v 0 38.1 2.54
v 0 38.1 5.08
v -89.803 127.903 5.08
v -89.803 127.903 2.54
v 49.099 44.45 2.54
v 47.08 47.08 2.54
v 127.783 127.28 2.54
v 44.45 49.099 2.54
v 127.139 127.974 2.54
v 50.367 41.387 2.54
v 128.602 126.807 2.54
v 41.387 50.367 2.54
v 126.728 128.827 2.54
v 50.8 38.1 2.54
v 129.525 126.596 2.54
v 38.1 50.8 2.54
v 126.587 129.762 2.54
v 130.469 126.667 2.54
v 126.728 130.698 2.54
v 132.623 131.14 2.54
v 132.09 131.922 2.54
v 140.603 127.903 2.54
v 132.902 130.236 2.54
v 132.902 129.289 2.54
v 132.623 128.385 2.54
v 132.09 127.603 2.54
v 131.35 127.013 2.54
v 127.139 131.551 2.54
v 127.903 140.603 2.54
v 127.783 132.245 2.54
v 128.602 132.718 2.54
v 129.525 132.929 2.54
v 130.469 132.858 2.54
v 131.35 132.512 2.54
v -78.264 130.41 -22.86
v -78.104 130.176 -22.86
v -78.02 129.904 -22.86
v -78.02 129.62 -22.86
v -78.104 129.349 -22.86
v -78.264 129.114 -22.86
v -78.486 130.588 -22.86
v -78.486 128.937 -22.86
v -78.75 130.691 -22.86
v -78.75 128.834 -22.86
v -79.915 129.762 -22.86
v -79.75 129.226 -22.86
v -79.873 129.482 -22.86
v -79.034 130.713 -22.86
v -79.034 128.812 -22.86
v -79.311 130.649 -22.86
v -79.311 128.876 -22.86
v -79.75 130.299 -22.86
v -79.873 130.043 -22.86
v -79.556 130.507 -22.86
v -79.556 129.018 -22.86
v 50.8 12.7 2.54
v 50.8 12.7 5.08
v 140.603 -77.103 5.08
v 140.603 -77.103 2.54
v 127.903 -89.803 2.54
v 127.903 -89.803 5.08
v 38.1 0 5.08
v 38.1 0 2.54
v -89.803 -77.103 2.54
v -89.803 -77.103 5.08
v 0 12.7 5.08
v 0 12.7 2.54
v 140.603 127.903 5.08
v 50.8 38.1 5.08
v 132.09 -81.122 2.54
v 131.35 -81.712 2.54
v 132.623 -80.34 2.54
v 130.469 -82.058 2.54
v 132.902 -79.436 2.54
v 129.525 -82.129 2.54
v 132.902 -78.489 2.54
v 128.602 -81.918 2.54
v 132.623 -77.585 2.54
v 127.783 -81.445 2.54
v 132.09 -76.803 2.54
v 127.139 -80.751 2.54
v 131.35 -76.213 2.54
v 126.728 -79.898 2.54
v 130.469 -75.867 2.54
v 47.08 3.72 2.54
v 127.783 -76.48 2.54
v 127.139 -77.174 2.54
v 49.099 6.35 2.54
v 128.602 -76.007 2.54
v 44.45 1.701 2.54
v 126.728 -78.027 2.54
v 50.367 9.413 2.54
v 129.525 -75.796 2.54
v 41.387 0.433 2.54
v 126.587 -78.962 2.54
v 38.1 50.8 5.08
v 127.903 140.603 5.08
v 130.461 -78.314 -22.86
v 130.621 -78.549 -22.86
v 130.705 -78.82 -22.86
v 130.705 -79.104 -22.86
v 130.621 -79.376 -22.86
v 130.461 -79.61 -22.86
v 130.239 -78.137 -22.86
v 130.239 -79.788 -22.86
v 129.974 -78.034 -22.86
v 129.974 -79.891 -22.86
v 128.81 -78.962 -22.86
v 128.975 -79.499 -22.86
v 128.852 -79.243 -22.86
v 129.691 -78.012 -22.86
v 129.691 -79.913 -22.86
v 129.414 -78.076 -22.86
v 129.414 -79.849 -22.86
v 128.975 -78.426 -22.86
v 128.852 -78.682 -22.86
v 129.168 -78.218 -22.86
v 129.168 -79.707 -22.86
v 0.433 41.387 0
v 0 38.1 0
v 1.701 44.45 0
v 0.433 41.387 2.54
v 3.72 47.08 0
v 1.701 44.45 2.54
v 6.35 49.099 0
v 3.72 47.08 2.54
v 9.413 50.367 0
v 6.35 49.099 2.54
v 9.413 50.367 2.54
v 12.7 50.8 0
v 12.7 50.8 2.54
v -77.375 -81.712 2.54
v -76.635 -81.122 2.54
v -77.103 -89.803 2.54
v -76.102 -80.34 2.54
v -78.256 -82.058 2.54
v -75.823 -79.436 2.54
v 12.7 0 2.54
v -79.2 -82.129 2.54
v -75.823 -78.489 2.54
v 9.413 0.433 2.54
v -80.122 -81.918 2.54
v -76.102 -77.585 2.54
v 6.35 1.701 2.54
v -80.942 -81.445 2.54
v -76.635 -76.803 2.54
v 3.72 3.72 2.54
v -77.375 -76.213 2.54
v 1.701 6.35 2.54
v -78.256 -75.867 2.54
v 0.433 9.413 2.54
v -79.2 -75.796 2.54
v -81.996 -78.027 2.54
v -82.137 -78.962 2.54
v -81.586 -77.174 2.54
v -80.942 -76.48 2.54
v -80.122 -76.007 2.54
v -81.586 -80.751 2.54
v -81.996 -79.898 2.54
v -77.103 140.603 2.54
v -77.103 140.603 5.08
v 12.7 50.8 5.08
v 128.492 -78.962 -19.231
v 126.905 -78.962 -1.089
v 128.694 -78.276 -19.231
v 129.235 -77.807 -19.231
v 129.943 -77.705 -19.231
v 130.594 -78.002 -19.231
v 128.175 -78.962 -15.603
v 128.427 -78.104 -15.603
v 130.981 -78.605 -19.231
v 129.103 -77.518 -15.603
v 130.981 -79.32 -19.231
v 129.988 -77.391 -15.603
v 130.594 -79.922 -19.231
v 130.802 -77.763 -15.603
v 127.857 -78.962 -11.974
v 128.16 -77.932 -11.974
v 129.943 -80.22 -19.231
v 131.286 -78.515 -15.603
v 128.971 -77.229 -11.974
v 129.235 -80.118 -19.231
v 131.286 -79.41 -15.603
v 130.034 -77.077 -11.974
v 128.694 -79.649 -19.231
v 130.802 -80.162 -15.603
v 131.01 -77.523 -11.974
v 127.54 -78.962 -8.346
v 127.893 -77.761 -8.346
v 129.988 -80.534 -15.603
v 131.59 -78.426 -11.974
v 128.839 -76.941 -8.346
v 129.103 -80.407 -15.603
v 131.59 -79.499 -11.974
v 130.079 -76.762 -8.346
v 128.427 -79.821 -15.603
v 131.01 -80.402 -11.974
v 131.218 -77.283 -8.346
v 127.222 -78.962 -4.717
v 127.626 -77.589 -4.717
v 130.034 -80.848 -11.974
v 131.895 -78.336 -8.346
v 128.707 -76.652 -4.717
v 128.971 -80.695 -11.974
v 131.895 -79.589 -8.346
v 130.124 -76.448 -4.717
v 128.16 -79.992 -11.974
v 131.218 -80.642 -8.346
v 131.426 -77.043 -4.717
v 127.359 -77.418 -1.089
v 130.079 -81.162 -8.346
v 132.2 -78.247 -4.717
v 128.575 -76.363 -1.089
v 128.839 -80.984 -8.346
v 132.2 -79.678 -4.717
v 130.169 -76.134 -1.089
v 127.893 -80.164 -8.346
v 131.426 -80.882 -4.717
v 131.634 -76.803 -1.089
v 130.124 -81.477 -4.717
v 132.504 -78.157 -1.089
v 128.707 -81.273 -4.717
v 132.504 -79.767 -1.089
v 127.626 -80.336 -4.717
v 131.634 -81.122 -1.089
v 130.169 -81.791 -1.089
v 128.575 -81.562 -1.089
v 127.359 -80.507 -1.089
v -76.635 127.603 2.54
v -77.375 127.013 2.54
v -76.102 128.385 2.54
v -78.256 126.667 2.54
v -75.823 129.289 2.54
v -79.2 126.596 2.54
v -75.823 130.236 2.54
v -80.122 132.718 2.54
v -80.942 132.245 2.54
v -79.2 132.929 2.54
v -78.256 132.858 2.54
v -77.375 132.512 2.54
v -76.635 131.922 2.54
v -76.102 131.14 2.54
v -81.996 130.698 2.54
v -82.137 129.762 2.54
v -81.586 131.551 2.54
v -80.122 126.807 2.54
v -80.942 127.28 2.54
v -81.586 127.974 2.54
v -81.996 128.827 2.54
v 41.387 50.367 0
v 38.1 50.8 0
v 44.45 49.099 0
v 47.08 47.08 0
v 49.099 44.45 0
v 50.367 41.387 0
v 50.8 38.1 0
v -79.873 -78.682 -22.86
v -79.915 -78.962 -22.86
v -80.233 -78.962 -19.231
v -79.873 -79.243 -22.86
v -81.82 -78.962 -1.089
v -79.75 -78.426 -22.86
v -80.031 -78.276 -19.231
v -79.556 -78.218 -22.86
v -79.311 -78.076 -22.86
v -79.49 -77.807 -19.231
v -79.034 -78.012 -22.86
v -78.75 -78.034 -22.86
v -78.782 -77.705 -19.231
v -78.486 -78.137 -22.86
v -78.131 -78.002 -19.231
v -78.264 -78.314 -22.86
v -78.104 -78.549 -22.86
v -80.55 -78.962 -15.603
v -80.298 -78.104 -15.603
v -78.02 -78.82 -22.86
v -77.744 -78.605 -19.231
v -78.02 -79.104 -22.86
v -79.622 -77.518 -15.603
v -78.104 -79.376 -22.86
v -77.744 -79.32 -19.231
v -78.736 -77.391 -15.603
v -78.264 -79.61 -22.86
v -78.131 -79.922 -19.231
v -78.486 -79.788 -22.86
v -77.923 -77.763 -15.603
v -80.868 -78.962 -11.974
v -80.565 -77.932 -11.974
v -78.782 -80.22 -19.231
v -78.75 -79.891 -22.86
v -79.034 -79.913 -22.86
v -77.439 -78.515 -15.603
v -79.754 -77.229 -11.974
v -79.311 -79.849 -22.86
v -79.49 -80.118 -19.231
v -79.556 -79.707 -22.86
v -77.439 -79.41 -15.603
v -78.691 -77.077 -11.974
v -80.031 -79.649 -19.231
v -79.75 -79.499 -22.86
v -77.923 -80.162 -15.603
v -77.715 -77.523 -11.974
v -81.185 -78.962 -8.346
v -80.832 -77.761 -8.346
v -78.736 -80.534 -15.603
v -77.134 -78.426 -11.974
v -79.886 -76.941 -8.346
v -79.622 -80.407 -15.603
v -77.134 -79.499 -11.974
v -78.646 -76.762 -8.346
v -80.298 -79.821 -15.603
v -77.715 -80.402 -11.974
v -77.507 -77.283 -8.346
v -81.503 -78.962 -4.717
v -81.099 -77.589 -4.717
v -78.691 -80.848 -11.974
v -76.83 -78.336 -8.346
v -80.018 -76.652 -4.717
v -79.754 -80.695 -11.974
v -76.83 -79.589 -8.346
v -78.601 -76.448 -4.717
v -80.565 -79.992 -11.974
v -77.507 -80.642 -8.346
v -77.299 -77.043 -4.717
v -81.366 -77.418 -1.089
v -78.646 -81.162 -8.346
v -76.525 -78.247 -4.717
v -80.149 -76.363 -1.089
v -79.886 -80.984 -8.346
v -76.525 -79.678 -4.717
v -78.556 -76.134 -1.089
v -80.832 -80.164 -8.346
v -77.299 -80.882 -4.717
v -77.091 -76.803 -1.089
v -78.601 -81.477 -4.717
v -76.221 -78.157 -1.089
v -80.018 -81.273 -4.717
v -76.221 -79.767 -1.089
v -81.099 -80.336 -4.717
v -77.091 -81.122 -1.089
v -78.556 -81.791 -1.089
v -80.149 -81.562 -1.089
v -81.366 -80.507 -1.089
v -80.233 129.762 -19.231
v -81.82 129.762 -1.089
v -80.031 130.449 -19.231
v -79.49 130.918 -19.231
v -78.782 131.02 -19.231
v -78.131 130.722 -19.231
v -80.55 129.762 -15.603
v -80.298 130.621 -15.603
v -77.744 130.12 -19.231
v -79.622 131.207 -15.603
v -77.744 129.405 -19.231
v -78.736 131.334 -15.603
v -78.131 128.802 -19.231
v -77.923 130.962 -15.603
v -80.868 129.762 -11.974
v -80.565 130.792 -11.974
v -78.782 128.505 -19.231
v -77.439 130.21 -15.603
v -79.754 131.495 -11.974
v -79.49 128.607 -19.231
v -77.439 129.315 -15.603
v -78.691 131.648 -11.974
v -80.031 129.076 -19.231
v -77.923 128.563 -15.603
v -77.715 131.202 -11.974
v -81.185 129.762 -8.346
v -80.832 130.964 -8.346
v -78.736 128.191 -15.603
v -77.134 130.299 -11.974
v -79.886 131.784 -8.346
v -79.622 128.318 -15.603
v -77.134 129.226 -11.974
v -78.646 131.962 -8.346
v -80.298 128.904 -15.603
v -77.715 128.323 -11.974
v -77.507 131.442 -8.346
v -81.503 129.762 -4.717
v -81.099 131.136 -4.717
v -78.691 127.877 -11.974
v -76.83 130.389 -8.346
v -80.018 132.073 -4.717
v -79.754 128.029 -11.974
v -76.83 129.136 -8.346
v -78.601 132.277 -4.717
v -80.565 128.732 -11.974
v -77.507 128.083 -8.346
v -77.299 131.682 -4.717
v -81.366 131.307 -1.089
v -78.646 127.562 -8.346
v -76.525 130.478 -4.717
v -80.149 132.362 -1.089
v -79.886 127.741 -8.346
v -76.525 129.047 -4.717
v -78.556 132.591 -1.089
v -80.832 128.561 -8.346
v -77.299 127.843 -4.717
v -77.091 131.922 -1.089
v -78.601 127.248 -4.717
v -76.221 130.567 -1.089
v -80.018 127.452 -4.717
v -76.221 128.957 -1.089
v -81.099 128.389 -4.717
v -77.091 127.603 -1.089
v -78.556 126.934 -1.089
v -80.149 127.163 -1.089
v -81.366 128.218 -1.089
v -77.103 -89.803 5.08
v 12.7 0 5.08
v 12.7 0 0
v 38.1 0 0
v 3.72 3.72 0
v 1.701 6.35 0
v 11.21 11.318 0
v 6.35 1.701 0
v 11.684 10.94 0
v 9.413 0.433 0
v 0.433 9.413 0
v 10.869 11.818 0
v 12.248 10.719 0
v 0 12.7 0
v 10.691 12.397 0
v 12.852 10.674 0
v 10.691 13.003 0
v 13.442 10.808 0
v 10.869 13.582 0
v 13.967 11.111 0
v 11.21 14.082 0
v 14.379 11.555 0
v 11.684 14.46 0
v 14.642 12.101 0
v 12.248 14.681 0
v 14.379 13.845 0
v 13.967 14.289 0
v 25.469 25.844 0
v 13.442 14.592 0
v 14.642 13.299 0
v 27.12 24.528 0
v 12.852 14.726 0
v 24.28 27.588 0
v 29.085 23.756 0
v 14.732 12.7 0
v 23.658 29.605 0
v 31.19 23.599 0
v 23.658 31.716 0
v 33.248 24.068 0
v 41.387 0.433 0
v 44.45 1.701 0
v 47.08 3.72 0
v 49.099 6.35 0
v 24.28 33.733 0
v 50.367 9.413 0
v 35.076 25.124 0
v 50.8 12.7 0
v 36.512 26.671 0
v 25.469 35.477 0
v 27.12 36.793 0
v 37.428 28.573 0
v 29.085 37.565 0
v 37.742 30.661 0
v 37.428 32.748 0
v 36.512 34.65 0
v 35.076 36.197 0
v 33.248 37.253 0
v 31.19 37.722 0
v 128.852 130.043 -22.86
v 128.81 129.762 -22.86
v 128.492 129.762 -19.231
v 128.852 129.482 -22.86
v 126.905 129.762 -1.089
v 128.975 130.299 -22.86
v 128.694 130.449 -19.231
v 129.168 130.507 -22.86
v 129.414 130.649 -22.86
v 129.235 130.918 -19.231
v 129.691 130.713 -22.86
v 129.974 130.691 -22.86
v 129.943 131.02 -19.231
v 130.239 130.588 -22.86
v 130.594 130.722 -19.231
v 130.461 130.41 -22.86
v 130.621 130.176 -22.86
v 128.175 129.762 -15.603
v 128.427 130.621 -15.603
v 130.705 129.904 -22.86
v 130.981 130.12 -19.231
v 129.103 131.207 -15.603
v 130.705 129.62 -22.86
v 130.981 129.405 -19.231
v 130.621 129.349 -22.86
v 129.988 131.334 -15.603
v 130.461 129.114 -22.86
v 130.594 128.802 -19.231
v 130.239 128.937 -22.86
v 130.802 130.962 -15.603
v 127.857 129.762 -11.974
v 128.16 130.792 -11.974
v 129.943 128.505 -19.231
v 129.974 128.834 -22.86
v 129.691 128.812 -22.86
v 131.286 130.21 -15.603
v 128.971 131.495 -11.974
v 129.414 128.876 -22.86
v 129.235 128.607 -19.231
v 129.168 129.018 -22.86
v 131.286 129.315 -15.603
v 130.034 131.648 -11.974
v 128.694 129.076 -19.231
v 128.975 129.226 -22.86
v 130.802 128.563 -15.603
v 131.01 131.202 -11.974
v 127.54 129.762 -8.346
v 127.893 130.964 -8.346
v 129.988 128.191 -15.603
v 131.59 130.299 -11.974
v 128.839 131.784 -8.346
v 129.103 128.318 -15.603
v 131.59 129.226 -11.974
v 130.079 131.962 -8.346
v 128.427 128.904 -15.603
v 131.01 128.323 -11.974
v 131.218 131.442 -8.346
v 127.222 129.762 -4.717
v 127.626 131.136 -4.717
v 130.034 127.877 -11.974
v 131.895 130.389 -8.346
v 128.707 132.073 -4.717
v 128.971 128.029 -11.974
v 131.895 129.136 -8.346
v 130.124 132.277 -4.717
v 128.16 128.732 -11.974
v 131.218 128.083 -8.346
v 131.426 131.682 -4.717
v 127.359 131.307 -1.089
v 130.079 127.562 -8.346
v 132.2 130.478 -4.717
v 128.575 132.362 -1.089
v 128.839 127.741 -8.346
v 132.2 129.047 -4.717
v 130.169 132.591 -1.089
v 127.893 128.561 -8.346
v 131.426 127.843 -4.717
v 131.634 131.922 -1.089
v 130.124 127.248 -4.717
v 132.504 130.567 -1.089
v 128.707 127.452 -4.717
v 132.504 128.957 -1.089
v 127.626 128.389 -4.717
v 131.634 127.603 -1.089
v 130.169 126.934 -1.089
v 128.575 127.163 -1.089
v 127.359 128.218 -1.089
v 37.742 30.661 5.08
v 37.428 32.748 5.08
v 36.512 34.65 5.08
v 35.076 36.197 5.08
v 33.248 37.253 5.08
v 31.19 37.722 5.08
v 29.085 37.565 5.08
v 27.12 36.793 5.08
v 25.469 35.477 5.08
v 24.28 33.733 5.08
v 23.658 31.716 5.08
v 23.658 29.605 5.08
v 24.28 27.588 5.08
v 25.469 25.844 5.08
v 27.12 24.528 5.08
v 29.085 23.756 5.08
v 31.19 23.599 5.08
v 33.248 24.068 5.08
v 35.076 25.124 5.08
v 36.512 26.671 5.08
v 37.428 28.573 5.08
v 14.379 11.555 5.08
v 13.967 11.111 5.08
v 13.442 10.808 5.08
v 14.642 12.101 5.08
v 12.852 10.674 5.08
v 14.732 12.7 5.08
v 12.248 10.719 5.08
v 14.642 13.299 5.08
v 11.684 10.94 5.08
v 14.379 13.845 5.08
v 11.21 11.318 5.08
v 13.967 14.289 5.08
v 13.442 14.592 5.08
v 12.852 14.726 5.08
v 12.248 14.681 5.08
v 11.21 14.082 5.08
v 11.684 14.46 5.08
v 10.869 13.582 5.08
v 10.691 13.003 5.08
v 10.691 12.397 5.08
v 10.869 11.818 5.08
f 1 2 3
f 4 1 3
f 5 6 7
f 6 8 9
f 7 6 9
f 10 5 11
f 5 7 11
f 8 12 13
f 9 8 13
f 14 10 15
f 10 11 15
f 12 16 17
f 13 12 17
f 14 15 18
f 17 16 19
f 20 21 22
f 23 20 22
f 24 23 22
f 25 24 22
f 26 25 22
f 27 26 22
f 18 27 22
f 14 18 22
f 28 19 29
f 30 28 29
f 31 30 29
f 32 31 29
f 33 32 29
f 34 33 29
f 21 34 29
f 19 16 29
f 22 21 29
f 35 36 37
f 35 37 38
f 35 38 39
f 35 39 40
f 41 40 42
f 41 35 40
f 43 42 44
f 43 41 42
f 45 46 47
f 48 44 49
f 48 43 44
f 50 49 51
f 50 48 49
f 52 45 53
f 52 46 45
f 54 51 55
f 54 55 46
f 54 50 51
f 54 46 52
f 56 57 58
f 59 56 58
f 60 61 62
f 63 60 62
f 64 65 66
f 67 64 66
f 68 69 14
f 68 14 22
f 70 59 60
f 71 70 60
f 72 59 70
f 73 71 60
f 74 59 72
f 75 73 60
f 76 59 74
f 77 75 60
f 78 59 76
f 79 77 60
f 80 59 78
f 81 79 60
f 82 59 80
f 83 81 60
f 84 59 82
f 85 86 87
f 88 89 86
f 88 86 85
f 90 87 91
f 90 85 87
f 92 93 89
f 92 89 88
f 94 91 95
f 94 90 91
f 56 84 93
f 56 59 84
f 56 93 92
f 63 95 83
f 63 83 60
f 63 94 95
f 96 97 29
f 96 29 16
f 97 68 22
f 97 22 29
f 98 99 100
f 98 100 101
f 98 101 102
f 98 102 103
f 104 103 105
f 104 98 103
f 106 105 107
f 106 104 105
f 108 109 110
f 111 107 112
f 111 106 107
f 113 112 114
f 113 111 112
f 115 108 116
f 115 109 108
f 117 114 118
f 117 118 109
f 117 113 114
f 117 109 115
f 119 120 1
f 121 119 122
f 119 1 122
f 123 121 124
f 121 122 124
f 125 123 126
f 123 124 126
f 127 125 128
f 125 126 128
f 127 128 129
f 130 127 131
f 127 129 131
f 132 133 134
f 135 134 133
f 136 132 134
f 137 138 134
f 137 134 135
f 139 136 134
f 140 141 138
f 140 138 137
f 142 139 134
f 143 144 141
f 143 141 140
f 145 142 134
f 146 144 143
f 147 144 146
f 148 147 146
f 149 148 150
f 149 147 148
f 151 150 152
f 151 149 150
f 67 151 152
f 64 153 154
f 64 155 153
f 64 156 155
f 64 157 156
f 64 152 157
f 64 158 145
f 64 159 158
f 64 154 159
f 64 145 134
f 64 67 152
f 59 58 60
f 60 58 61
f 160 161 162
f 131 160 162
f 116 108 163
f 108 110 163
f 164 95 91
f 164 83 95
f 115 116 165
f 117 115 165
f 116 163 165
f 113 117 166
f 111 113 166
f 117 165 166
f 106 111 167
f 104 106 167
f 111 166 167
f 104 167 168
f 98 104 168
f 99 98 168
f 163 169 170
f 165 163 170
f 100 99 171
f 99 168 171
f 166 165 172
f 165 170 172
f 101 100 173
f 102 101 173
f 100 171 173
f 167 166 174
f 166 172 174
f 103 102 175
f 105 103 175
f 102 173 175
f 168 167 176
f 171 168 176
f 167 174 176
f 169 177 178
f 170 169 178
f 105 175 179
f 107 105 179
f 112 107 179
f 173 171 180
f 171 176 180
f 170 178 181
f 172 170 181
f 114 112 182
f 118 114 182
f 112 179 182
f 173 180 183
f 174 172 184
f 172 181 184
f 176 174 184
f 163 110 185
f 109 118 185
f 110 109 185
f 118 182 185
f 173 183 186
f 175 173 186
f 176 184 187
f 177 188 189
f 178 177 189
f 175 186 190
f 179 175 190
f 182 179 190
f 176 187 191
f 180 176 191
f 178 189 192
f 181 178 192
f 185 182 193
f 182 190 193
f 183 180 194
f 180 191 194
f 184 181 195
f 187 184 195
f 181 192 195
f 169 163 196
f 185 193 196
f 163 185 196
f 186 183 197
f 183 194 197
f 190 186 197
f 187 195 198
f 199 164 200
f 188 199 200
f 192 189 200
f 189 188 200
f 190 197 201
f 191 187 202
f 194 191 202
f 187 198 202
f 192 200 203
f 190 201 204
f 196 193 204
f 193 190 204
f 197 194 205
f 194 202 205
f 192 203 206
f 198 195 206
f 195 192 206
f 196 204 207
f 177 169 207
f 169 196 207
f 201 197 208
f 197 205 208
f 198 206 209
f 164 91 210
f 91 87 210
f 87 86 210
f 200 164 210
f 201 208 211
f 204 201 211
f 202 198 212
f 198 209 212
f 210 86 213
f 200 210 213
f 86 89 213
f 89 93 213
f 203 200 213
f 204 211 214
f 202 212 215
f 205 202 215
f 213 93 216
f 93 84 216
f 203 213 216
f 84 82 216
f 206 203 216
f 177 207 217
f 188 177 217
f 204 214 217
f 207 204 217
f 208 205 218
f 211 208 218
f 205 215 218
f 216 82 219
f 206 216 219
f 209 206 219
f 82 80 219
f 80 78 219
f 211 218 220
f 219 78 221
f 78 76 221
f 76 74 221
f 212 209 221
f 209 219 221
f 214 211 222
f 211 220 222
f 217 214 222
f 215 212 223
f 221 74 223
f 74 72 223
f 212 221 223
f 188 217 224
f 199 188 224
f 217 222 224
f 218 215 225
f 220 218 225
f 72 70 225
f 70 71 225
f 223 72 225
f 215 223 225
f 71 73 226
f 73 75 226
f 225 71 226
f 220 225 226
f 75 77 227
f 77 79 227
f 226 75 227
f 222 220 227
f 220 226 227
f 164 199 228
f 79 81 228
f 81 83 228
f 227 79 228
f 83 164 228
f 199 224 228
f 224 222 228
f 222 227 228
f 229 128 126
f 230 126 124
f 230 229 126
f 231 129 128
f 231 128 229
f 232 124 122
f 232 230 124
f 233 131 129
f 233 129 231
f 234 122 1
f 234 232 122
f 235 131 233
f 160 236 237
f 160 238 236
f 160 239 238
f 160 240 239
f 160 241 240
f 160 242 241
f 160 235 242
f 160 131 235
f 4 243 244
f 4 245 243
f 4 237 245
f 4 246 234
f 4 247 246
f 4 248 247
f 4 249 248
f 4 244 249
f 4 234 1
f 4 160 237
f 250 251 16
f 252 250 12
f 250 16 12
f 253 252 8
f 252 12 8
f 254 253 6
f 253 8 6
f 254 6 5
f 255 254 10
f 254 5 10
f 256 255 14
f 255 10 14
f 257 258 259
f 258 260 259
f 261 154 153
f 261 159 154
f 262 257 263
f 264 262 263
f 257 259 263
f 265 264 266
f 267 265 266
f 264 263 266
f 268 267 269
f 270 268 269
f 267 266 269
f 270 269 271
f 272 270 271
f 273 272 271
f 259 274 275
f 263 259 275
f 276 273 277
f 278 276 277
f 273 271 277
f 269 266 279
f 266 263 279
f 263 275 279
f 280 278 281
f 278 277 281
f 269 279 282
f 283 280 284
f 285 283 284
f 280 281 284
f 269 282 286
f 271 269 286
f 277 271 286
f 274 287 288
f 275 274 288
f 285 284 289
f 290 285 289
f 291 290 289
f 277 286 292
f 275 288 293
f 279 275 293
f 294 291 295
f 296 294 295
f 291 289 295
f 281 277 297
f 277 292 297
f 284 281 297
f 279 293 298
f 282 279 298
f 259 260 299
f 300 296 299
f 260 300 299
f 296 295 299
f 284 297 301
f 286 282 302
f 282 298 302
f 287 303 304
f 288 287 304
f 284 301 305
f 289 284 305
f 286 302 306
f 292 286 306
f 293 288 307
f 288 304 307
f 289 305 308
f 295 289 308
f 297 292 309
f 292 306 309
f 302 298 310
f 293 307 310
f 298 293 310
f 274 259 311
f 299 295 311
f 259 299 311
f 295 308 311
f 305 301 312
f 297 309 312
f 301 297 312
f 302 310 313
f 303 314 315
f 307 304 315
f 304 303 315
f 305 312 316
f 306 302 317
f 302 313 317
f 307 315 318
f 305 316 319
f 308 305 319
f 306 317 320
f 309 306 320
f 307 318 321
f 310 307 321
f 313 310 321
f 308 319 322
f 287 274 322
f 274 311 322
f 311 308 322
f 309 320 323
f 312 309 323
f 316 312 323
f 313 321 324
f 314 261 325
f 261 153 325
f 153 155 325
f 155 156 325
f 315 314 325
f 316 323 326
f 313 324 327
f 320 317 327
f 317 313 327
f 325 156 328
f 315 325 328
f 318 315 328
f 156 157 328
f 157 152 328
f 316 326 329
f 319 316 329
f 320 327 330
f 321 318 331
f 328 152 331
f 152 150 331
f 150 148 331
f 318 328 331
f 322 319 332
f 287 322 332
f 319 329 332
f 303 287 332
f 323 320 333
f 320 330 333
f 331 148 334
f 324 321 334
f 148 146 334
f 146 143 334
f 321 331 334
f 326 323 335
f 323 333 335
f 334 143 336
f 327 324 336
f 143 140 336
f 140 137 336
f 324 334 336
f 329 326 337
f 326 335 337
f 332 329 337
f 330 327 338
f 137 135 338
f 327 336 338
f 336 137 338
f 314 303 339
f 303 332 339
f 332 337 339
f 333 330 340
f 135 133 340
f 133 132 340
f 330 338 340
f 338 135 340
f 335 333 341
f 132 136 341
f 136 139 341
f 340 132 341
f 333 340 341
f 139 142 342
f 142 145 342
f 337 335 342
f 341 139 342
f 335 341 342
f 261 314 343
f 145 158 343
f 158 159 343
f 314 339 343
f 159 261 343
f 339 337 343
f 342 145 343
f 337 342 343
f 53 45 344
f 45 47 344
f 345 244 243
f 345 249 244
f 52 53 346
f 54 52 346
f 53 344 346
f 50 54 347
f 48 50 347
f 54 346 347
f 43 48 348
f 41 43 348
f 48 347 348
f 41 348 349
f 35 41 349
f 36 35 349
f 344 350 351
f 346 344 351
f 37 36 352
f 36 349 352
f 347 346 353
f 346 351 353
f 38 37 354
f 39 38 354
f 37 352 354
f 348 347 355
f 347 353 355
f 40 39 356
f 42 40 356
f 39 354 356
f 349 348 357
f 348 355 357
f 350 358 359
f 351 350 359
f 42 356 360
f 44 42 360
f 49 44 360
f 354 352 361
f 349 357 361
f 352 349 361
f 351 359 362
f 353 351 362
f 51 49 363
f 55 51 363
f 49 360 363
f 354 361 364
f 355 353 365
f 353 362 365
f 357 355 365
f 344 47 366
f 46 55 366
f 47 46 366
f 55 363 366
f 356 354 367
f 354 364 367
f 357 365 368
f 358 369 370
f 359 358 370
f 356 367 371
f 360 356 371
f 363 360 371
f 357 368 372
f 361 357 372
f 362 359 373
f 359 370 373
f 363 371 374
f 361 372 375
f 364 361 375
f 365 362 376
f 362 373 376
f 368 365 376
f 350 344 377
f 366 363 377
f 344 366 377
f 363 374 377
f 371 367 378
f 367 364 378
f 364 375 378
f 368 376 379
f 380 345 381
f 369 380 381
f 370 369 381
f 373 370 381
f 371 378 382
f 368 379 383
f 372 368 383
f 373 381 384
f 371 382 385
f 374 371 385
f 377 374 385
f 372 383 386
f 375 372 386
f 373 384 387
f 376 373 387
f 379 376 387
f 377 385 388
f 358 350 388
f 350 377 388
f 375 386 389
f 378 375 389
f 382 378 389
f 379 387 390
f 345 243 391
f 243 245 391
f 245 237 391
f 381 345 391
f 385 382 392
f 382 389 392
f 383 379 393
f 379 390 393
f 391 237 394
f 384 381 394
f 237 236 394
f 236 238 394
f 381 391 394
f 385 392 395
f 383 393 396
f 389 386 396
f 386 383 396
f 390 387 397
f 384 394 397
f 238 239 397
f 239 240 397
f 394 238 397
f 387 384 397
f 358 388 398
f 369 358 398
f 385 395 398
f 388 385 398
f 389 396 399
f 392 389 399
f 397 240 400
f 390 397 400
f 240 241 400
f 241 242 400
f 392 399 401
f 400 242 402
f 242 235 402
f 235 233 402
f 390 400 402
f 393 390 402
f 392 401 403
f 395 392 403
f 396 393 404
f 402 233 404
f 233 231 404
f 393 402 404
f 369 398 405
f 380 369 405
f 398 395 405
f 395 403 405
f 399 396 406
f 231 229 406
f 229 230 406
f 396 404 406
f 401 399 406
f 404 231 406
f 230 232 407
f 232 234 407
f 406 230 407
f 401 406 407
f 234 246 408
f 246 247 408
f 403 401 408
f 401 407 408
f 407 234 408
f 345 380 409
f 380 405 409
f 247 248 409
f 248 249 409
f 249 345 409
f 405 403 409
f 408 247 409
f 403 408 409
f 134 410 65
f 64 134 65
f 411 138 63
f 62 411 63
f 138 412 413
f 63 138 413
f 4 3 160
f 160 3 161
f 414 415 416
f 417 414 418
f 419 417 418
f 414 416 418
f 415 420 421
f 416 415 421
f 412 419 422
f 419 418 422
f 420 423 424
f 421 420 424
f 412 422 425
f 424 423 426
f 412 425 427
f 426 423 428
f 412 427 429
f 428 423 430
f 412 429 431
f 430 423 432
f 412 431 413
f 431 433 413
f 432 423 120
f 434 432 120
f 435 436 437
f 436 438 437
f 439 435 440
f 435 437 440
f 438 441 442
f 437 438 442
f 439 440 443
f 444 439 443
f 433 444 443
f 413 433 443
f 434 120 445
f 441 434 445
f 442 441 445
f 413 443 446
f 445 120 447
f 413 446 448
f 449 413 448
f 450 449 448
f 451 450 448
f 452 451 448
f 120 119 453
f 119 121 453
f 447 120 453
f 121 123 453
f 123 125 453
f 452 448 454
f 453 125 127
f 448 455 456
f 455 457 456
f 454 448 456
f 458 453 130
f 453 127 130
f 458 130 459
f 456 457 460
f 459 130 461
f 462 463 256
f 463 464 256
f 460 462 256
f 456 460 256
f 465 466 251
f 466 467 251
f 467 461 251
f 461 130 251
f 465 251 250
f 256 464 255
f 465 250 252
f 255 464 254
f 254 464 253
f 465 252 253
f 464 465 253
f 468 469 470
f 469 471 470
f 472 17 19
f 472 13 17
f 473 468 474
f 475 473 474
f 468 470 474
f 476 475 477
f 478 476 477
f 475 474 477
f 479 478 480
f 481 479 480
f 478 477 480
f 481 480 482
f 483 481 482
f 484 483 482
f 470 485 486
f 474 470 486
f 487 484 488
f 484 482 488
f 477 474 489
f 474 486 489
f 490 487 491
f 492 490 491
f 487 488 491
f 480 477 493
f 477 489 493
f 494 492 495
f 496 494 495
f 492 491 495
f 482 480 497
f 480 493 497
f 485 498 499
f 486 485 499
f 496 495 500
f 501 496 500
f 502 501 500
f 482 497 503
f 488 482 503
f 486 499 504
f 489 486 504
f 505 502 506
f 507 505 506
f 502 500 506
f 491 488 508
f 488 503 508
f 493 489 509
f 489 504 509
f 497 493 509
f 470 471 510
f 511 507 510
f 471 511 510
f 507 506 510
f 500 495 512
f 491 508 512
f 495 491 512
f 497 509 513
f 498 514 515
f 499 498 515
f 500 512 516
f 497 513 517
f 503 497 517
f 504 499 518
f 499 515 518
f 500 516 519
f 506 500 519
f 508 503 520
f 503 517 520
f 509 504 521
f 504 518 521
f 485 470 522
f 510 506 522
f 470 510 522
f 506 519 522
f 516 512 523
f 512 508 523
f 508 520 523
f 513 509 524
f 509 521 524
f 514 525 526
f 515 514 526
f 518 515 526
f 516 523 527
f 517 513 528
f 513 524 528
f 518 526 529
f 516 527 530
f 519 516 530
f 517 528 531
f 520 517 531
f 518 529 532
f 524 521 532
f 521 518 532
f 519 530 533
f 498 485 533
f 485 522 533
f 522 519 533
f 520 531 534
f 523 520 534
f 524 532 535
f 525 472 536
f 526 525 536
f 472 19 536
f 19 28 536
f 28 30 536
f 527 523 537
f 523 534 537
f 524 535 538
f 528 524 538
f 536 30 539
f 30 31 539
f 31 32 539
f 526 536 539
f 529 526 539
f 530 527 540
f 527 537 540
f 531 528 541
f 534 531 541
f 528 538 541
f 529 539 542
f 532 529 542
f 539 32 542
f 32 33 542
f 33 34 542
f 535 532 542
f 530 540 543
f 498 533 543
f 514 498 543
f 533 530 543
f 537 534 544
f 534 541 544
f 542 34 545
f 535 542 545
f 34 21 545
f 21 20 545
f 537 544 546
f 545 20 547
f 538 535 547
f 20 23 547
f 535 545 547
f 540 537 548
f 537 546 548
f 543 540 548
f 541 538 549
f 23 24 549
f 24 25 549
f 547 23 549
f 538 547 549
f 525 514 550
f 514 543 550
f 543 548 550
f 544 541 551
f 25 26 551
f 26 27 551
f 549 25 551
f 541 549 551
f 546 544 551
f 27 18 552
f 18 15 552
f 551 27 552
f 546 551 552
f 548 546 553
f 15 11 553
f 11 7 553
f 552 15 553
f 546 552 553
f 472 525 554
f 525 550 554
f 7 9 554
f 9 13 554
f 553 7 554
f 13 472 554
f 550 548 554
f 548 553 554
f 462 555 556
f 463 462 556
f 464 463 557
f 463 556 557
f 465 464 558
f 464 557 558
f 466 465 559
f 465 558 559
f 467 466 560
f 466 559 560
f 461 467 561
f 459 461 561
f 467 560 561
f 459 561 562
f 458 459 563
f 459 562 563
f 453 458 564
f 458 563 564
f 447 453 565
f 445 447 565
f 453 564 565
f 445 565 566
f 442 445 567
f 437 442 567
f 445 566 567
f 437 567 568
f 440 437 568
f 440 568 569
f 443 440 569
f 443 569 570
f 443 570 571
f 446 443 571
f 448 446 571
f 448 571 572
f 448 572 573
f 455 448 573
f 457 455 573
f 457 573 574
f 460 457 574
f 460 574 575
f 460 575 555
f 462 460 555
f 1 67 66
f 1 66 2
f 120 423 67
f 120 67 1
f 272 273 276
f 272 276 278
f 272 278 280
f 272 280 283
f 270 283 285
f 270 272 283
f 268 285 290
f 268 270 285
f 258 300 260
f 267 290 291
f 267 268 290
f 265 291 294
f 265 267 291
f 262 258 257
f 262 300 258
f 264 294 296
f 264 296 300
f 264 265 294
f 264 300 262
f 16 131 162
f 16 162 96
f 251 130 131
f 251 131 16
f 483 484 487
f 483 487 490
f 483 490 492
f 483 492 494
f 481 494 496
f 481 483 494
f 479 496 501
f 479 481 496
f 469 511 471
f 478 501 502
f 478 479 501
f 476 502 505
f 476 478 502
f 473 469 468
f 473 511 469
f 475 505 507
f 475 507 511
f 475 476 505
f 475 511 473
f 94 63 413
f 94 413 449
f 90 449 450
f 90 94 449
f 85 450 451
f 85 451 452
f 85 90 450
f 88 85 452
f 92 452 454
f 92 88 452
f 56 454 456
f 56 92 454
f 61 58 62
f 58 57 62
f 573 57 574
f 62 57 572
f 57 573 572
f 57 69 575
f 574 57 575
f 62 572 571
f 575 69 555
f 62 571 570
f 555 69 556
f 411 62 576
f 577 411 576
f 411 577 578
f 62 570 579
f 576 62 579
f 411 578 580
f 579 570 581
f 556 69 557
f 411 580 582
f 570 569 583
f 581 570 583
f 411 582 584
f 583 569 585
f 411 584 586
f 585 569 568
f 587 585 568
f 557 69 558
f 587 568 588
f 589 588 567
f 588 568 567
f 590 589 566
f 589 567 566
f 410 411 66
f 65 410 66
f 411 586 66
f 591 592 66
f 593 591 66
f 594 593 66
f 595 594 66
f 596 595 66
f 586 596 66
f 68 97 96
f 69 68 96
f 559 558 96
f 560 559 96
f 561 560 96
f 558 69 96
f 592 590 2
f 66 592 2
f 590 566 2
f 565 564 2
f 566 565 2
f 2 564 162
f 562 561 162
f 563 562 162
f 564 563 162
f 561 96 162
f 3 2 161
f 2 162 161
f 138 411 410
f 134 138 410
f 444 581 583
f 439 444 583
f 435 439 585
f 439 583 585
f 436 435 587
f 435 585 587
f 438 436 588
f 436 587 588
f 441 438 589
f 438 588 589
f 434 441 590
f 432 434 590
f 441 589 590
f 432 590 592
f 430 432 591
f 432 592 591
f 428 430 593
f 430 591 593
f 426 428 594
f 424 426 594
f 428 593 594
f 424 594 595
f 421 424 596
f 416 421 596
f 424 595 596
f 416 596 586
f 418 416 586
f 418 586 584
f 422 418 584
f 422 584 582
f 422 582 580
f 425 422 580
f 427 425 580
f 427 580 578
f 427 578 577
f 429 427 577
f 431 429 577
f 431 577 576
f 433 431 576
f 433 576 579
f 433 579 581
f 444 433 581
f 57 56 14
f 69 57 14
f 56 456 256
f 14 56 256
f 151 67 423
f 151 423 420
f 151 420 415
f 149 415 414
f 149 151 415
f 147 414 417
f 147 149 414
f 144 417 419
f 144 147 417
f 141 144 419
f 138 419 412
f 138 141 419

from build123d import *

# Parameters (mm, degrees)
SKETCH3_W                     = 50.8
SKETCH3_H                     = 50.8
BOSS_EXTRUDE2_DEPTH           = 5.08
SKETCH4_R                     = 2.032
CUT_EXTRUDE2_DEPTH            = 73.021430144
FILLET2_R                     = 12.7
BOSS_EXTRUDE3_DEPTH           = 2.54
SKETCH6_R                     = 3.175
BOSS_EXTRUDE4_DEPTH           = 25.4
BOSS_EXTRUDE4_DRAFT           = 5
BOSS_EXTRUDE4_PROFILE_2_DEPTH = 25.4
BOSS_EXTRUDE4_PROFILE_2_DRAFT = 5
BOSS_EXTRUDE4_PROFILE_3_DEPTH = 25.4
BOSS_EXTRUDE4_PROFILE_3_DRAFT = 5
BOSS_EXTRUDE4_PROFILE_4_DEPTH = 25.4
BOSS_EXTRUDE4_PROFILE_4_DRAFT = 5
SKETCH7_R                     = 7.081764105
CUT_EXTRUDE3_DEPTH            = 201.795428329


with BuildPart() as part:
    # Sketch3 → Boss-Extrude2 (new body)
    with BuildSketch(Plane.XY):
        with Locations((25.4, 25.4)):
            Rectangle(SKETCH3_W, SKETCH3_H)
    extrude(amount=BOSS_EXTRUDE2_DEPTH)

    # Sketch4 → Cut-Extrude2 (cut, through all)
    with BuildSketch(Plane.XY.offset(5.08)):
        with Locations((12.7, 12.7)):
            Circle(SKETCH4_R)
    extrude(amount=-CUT_EXTRUDE2_DEPTH, mode=Mode.SUBTRACT)

    # Fillet2
    fillet2_edges = [part.edges().sort_by_distance(p)[0] for p in [
        (0, 50.8, 2.54),
        (50.8, 50.8, 2.54),
        (50.8, 0, 2.54),
        (0, 0, 2.54),
    ]]
    fillet(fillet2_edges, radius=FILLET2_R)

    # Sketch5 → Boss-Extrude3 (add)
    with BuildSketch(Plane.XY.offset(5.08)):
        Polygon((127.902561211, -89.802561211), (38.1, 0), (50.8, 12.7), (140.602561211, -77.102561211), align=None)
        Polygon((-89.802561211, -77.102561211), (0, 12.7), (12.7, 0), (-77.102561211, -89.802561211), align=None)
        Polygon((0, 38.1), (-89.802561211, 127.902561211), (-77.102561211, 140.602561211), (12.7, 50.8), align=None)
        Polygon((50.8, 38.1), (140.602561211, 127.902561211), (127.902561211, 140.602561211), (38.1, 50.8), align=None)
    extrude(amount=-BOSS_EXTRUDE3_DEPTH)


with BuildPart() as boss_extrude4_tool:
    # Sketch6 → Boss-Extrude4 (with draft: the straight prism first)
    with BuildSketch(Plane(origin=(0, 0, 2.54), x_dir=(-1, 0, 0), z_dir=(0, 0, -1))):
        with Locations((-129.76243315, 129.76243315)):
            Circle(SKETCH6_R)
    extrude(amount=BOSS_EXTRUDE4_DEPTH)
    # Boss-Extrude4: the draft: its side faces are tilted about the plane it starts from
    boss_extrude4_sides = [boss_extrude4_tool.faces().sort_by_distance(p)[0] for p in [
        (132.93743315, 129.76243315, -10.16),
    ]]
    draft(boss_extrude4_sides, Plane(origin=(0, 0, 2.54), x_dir=(-1, 0, 0), z_dir=(0, 0, -1)), BOSS_EXTRUDE4_DRAFT)


with BuildPart() as part_1:
    add(part.part)

    # Boss-Extrude4: add boss_extrude4_tool
    add(boss_extrude4_tool.part)


with BuildPart() as boss_extrude4_profile_2_tool:
    # Sketch6 → Boss-Extrude4 profile 2 (with draft: the straight prism first)
    with BuildSketch(Plane(origin=(0, 0, 2.54), x_dir=(-1, 0, 0), z_dir=(0, 0, -1))):
        with Locations((78.96243315, 129.76243315)):
            Circle(SKETCH6_R)
    extrude(amount=BOSS_EXTRUDE4_PROFILE_2_DEPTH)
    # Boss-Extrude4 profile 2: the draft: its side faces are tilted about the plane it starts from
    boss_extrude4_profile_2_sides = [boss_extrude4_profile_2_tool.faces().sort_by_distance(p)[0] for p in [
        (-75.78743315, 129.76243315, -10.16),
    ]]
    draft(boss_extrude4_profile_2_sides, Plane(origin=(0, 0, 2.54), x_dir=(-1, 0, 0), z_dir=(0, 0, -1)), BOSS_EXTRUDE4_PROFILE_2_DRAFT)


with BuildPart() as part_2:
    add(part_1.part)

    # Boss-Extrude4 profile 2: add boss_extrude4_profile_2_tool
    add(boss_extrude4_profile_2_tool.part)


with BuildPart() as boss_extrude4_profile_3_tool:
    # Sketch6 → Boss-Extrude4 profile 3 (with draft: the straight prism first)
    with BuildSketch(Plane(origin=(0, 0, 2.54), x_dir=(-1, 0, 0), z_dir=(0, 0, -1))):
        with Locations((78.96243315, -78.96243315)):
            Circle(SKETCH6_R)
    extrude(amount=BOSS_EXTRUDE4_PROFILE_3_DEPTH)
    # Boss-Extrude4 profile 3: the draft: its side faces are tilted about the plane it starts from
    boss_extrude4_profile_3_sides = [boss_extrude4_profile_3_tool.faces().sort_by_distance(p)[0] for p in [
        (-75.78743315, -78.96243315, -10.16),
    ]]
    draft(boss_extrude4_profile_3_sides, Plane(origin=(0, 0, 2.54), x_dir=(-1, 0, 0), z_dir=(0, 0, -1)), BOSS_EXTRUDE4_PROFILE_3_DRAFT)


with BuildPart() as part_3:
    add(part_2.part)

    # Boss-Extrude4 profile 3: add boss_extrude4_profile_3_tool
    add(boss_extrude4_profile_3_tool.part)


with BuildPart() as boss_extrude4_profile_4_tool:
    # Sketch6 → Boss-Extrude4 profile 4 (with draft: the straight prism first)
    with BuildSketch(Plane(origin=(0, 0, 2.54), x_dir=(-1, 0, 0), z_dir=(0, 0, -1))):
        with Locations((-129.76243315, -78.96243315)):
            Circle(SKETCH6_R)
    extrude(amount=BOSS_EXTRUDE4_PROFILE_4_DEPTH)
    # Boss-Extrude4 profile 4: the draft: its side faces are tilted about the plane it starts from
    boss_extrude4_profile_4_sides = [boss_extrude4_profile_4_tool.faces().sort_by_distance(p)[0] for p in [
        (132.93743315, -78.96243315, -10.16),
    ]]
    draft(boss_extrude4_profile_4_sides, Plane(origin=(0, 0, 2.54), x_dir=(-1, 0, 0), z_dir=(0, 0, -1)), BOSS_EXTRUDE4_PROFILE_4_DRAFT)


with BuildPart() as part_4:
    add(part_3.part)

    # Boss-Extrude4 profile 4: add boss_extrude4_profile_4_tool
    add(boss_extrude4_profile_4_tool.part)

    # Sketch7 → Cut-Extrude3 (cut, through all)
    with BuildSketch(Plane.XY.offset(5.08)):
        with Locations((30.660512242, 30.660512242)):
            Circle(SKETCH7_R)
    extrude(amount=-CUT_EXTRUDE3_DEPTH, mode=Mode.SUBTRACT)


solid = part_4.part
